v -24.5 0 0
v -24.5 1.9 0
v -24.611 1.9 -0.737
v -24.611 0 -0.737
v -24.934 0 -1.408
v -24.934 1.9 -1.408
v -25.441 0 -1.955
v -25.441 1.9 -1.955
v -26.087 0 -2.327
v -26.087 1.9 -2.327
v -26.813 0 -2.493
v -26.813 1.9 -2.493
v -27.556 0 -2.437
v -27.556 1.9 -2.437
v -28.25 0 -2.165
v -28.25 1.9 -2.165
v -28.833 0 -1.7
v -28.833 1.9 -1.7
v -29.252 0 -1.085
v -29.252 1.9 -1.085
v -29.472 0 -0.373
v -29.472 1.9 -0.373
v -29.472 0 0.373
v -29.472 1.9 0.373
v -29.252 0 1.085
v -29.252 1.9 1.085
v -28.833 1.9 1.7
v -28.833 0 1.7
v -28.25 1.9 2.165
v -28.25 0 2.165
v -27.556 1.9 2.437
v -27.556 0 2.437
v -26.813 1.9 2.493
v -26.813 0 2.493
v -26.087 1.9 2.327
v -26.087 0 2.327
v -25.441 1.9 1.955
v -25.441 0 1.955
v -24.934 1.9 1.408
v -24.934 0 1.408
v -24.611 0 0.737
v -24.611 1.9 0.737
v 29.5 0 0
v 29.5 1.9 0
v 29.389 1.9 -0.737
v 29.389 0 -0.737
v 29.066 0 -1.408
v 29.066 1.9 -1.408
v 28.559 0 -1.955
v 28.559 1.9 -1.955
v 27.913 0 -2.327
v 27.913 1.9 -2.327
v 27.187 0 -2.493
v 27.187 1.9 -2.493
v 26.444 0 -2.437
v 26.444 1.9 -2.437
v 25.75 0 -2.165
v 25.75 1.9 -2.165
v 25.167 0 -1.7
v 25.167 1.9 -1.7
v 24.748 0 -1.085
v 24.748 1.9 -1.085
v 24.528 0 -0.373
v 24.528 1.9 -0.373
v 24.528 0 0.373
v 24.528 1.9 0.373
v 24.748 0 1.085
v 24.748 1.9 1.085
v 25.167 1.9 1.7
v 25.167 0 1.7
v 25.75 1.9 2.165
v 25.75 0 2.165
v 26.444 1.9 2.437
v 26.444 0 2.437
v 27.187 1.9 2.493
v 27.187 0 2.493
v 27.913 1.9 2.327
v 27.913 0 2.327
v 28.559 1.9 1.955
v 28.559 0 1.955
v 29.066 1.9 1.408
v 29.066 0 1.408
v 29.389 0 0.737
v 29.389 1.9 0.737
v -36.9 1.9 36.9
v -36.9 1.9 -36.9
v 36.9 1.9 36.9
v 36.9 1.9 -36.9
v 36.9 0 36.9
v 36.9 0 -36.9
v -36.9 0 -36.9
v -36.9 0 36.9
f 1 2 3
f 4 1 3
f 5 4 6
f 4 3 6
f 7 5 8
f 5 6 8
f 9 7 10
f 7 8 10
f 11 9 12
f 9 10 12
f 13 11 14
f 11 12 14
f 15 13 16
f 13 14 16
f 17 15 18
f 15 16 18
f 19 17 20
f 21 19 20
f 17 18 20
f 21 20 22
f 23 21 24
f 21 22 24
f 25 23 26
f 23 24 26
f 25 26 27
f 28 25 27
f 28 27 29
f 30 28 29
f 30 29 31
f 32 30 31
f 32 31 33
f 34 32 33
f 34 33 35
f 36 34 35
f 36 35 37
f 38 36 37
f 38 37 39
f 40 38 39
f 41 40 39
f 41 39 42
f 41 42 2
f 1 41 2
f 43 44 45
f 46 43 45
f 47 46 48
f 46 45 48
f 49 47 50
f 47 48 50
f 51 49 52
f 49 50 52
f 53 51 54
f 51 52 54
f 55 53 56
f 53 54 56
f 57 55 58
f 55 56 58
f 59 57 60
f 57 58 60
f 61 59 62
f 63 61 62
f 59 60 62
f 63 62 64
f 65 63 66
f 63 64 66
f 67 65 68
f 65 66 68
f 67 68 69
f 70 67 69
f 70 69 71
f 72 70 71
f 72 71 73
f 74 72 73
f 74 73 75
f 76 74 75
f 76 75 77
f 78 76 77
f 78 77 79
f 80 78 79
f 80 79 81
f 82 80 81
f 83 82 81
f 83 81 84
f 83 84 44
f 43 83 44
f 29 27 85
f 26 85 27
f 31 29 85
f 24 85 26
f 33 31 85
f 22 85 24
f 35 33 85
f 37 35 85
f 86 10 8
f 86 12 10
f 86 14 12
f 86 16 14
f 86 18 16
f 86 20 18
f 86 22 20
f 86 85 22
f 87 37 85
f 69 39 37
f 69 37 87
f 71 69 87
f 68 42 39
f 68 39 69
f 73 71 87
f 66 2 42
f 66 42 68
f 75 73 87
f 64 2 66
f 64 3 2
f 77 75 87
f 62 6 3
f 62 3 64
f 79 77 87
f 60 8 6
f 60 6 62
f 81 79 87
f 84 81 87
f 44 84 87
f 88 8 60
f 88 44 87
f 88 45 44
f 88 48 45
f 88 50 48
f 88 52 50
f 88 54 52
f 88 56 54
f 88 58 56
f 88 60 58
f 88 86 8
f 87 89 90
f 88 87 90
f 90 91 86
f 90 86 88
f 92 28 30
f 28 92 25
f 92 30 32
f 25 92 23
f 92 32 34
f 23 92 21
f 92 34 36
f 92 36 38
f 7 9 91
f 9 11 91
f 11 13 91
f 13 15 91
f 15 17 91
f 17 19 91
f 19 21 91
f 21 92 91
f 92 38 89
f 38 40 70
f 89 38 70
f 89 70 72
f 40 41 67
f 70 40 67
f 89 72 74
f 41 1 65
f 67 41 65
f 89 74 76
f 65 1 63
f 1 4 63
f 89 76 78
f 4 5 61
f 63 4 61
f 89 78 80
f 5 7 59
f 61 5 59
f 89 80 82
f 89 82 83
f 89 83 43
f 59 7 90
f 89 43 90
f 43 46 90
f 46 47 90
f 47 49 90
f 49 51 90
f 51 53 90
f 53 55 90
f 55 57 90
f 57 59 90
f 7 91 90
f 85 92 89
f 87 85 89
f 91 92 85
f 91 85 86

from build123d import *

# Parameters (mm, degrees)
CROQUIS1_W                 = 73.8
CROQUIS1_H                 = 73.8
SALIENTE_EXTRUIR3_DEPTH    = 1.9
CROQUIS2_R                 = 2.5
CORTAR_EXTRUIR1_DEPTH      = 1
CORTAR_EXTRUIR1_DEPTH_BACK = 2.9


with BuildPart() as part:
    # Croquis1 → Saliente-Extruir3 (new body)
    with BuildSketch(Plane(origin=(0, 0, 0), x_dir=(1, 0, 0), z_dir=(0, 1, 0))):
        Rectangle(CROQUIS1_W, CROQUIS1_H)
    extrude(amount=SALIENTE_EXTRUIR3_DEPTH)

    # Croquis2 → Cortar-Extruir1 (cut, two sides)
    with BuildSketch(Plane(origin=(0, 1.9, 0), x_dir=(1, 0, 0), z_dir=(0, 1, 0))) as cortar_extruir1_sk:
        with Locations((-27, 0)):
            Circle(CROQUIS2_R)
        with Locations((27, 0)):
            Circle(CROQUIS2_R)
    extrude(amount=CORTAR_EXTRUIR1_DEPTH, mode=Mode.SUBTRACT)
    extrude(cortar_extruir1_sk.sketch, amount=-CORTAR_EXTRUIR1_DEPTH_BACK, mode=Mode.SUBTRACT)


solid = part.part
